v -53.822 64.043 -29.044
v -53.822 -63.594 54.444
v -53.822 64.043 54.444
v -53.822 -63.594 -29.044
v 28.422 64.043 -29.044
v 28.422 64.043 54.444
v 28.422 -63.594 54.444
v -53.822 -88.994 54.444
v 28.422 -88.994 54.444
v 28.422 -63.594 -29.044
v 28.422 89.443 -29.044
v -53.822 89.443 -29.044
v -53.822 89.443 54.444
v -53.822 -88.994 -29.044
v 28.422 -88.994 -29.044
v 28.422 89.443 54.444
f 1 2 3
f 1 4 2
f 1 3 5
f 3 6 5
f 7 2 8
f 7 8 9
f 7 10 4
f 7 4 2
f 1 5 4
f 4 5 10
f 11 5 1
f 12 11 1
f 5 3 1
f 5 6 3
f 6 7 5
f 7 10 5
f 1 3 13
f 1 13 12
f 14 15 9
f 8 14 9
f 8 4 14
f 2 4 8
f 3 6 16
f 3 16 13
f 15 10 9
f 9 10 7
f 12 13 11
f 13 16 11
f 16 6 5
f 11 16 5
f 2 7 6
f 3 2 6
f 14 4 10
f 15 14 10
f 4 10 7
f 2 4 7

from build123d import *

# Parameters (mm, degrees)
F0_W     = 56.8431913853
F0_H     = 58.0880194902
F1_DEPTH = 64.043328166
F2_DEPTH = 63.593827188
F3_DEPTH = 25.4
F4_DEPTH = 25.4
F5_DEPTH = 25.4
F6_DEPTH = 25.4


with BuildPart() as f1:
    # F0 (on Front) → F1 (new body)
    with BuildSketch(Plane.XZ):
        Rectangle(F0_W, F0_H)
    extrude(amount=-F1_DEPTH)

    # F2 (add): a face of the model
    f2_faces = [f1.faces().sort_by_distance(p)[0] for p in [
        (0, 0, 0),
    ]]
    extrude(f2_faces, amount=F2_DEPTH)

    # F3 (add): a face of the model
    f3_faces = [f1.faces().sort_by_distance(p)[0] for p in [
        (0, 0.224750489, 29.0440097451),
    ]]
    extrude(f3_faces, amount=F3_DEPTH)

    # F4 (add): a face of the model
    f4_faces = [f1.faces().sort_by_distance(p)[0] for p in [
        (-28.4215956926, 0.224750489, 12.7),
    ]]
    extrude(f4_faces, amount=F4_DEPTH)


with BuildPart() as f5:
    # F5 (new): a face of the model
    f5_faces = [f1.part.faces().sort_by_distance(p)[0] for p in [
        (-12.7, -63.593827188, 12.7),
    ]]
    extrude(f5_faces, amount=F5_DEPTH)


with BuildPart() as f6:
    # F6 (new): a face of the model
    f6_faces = [f1.part.faces().sort_by_distance(p)[0] for p in [
        (-12.7, 64.043328166, 12.7),
    ]]
    extrude(f6_faces, amount=F6_DEPTH)


solid = Compound([f1.part, f5.part, f6.part])
